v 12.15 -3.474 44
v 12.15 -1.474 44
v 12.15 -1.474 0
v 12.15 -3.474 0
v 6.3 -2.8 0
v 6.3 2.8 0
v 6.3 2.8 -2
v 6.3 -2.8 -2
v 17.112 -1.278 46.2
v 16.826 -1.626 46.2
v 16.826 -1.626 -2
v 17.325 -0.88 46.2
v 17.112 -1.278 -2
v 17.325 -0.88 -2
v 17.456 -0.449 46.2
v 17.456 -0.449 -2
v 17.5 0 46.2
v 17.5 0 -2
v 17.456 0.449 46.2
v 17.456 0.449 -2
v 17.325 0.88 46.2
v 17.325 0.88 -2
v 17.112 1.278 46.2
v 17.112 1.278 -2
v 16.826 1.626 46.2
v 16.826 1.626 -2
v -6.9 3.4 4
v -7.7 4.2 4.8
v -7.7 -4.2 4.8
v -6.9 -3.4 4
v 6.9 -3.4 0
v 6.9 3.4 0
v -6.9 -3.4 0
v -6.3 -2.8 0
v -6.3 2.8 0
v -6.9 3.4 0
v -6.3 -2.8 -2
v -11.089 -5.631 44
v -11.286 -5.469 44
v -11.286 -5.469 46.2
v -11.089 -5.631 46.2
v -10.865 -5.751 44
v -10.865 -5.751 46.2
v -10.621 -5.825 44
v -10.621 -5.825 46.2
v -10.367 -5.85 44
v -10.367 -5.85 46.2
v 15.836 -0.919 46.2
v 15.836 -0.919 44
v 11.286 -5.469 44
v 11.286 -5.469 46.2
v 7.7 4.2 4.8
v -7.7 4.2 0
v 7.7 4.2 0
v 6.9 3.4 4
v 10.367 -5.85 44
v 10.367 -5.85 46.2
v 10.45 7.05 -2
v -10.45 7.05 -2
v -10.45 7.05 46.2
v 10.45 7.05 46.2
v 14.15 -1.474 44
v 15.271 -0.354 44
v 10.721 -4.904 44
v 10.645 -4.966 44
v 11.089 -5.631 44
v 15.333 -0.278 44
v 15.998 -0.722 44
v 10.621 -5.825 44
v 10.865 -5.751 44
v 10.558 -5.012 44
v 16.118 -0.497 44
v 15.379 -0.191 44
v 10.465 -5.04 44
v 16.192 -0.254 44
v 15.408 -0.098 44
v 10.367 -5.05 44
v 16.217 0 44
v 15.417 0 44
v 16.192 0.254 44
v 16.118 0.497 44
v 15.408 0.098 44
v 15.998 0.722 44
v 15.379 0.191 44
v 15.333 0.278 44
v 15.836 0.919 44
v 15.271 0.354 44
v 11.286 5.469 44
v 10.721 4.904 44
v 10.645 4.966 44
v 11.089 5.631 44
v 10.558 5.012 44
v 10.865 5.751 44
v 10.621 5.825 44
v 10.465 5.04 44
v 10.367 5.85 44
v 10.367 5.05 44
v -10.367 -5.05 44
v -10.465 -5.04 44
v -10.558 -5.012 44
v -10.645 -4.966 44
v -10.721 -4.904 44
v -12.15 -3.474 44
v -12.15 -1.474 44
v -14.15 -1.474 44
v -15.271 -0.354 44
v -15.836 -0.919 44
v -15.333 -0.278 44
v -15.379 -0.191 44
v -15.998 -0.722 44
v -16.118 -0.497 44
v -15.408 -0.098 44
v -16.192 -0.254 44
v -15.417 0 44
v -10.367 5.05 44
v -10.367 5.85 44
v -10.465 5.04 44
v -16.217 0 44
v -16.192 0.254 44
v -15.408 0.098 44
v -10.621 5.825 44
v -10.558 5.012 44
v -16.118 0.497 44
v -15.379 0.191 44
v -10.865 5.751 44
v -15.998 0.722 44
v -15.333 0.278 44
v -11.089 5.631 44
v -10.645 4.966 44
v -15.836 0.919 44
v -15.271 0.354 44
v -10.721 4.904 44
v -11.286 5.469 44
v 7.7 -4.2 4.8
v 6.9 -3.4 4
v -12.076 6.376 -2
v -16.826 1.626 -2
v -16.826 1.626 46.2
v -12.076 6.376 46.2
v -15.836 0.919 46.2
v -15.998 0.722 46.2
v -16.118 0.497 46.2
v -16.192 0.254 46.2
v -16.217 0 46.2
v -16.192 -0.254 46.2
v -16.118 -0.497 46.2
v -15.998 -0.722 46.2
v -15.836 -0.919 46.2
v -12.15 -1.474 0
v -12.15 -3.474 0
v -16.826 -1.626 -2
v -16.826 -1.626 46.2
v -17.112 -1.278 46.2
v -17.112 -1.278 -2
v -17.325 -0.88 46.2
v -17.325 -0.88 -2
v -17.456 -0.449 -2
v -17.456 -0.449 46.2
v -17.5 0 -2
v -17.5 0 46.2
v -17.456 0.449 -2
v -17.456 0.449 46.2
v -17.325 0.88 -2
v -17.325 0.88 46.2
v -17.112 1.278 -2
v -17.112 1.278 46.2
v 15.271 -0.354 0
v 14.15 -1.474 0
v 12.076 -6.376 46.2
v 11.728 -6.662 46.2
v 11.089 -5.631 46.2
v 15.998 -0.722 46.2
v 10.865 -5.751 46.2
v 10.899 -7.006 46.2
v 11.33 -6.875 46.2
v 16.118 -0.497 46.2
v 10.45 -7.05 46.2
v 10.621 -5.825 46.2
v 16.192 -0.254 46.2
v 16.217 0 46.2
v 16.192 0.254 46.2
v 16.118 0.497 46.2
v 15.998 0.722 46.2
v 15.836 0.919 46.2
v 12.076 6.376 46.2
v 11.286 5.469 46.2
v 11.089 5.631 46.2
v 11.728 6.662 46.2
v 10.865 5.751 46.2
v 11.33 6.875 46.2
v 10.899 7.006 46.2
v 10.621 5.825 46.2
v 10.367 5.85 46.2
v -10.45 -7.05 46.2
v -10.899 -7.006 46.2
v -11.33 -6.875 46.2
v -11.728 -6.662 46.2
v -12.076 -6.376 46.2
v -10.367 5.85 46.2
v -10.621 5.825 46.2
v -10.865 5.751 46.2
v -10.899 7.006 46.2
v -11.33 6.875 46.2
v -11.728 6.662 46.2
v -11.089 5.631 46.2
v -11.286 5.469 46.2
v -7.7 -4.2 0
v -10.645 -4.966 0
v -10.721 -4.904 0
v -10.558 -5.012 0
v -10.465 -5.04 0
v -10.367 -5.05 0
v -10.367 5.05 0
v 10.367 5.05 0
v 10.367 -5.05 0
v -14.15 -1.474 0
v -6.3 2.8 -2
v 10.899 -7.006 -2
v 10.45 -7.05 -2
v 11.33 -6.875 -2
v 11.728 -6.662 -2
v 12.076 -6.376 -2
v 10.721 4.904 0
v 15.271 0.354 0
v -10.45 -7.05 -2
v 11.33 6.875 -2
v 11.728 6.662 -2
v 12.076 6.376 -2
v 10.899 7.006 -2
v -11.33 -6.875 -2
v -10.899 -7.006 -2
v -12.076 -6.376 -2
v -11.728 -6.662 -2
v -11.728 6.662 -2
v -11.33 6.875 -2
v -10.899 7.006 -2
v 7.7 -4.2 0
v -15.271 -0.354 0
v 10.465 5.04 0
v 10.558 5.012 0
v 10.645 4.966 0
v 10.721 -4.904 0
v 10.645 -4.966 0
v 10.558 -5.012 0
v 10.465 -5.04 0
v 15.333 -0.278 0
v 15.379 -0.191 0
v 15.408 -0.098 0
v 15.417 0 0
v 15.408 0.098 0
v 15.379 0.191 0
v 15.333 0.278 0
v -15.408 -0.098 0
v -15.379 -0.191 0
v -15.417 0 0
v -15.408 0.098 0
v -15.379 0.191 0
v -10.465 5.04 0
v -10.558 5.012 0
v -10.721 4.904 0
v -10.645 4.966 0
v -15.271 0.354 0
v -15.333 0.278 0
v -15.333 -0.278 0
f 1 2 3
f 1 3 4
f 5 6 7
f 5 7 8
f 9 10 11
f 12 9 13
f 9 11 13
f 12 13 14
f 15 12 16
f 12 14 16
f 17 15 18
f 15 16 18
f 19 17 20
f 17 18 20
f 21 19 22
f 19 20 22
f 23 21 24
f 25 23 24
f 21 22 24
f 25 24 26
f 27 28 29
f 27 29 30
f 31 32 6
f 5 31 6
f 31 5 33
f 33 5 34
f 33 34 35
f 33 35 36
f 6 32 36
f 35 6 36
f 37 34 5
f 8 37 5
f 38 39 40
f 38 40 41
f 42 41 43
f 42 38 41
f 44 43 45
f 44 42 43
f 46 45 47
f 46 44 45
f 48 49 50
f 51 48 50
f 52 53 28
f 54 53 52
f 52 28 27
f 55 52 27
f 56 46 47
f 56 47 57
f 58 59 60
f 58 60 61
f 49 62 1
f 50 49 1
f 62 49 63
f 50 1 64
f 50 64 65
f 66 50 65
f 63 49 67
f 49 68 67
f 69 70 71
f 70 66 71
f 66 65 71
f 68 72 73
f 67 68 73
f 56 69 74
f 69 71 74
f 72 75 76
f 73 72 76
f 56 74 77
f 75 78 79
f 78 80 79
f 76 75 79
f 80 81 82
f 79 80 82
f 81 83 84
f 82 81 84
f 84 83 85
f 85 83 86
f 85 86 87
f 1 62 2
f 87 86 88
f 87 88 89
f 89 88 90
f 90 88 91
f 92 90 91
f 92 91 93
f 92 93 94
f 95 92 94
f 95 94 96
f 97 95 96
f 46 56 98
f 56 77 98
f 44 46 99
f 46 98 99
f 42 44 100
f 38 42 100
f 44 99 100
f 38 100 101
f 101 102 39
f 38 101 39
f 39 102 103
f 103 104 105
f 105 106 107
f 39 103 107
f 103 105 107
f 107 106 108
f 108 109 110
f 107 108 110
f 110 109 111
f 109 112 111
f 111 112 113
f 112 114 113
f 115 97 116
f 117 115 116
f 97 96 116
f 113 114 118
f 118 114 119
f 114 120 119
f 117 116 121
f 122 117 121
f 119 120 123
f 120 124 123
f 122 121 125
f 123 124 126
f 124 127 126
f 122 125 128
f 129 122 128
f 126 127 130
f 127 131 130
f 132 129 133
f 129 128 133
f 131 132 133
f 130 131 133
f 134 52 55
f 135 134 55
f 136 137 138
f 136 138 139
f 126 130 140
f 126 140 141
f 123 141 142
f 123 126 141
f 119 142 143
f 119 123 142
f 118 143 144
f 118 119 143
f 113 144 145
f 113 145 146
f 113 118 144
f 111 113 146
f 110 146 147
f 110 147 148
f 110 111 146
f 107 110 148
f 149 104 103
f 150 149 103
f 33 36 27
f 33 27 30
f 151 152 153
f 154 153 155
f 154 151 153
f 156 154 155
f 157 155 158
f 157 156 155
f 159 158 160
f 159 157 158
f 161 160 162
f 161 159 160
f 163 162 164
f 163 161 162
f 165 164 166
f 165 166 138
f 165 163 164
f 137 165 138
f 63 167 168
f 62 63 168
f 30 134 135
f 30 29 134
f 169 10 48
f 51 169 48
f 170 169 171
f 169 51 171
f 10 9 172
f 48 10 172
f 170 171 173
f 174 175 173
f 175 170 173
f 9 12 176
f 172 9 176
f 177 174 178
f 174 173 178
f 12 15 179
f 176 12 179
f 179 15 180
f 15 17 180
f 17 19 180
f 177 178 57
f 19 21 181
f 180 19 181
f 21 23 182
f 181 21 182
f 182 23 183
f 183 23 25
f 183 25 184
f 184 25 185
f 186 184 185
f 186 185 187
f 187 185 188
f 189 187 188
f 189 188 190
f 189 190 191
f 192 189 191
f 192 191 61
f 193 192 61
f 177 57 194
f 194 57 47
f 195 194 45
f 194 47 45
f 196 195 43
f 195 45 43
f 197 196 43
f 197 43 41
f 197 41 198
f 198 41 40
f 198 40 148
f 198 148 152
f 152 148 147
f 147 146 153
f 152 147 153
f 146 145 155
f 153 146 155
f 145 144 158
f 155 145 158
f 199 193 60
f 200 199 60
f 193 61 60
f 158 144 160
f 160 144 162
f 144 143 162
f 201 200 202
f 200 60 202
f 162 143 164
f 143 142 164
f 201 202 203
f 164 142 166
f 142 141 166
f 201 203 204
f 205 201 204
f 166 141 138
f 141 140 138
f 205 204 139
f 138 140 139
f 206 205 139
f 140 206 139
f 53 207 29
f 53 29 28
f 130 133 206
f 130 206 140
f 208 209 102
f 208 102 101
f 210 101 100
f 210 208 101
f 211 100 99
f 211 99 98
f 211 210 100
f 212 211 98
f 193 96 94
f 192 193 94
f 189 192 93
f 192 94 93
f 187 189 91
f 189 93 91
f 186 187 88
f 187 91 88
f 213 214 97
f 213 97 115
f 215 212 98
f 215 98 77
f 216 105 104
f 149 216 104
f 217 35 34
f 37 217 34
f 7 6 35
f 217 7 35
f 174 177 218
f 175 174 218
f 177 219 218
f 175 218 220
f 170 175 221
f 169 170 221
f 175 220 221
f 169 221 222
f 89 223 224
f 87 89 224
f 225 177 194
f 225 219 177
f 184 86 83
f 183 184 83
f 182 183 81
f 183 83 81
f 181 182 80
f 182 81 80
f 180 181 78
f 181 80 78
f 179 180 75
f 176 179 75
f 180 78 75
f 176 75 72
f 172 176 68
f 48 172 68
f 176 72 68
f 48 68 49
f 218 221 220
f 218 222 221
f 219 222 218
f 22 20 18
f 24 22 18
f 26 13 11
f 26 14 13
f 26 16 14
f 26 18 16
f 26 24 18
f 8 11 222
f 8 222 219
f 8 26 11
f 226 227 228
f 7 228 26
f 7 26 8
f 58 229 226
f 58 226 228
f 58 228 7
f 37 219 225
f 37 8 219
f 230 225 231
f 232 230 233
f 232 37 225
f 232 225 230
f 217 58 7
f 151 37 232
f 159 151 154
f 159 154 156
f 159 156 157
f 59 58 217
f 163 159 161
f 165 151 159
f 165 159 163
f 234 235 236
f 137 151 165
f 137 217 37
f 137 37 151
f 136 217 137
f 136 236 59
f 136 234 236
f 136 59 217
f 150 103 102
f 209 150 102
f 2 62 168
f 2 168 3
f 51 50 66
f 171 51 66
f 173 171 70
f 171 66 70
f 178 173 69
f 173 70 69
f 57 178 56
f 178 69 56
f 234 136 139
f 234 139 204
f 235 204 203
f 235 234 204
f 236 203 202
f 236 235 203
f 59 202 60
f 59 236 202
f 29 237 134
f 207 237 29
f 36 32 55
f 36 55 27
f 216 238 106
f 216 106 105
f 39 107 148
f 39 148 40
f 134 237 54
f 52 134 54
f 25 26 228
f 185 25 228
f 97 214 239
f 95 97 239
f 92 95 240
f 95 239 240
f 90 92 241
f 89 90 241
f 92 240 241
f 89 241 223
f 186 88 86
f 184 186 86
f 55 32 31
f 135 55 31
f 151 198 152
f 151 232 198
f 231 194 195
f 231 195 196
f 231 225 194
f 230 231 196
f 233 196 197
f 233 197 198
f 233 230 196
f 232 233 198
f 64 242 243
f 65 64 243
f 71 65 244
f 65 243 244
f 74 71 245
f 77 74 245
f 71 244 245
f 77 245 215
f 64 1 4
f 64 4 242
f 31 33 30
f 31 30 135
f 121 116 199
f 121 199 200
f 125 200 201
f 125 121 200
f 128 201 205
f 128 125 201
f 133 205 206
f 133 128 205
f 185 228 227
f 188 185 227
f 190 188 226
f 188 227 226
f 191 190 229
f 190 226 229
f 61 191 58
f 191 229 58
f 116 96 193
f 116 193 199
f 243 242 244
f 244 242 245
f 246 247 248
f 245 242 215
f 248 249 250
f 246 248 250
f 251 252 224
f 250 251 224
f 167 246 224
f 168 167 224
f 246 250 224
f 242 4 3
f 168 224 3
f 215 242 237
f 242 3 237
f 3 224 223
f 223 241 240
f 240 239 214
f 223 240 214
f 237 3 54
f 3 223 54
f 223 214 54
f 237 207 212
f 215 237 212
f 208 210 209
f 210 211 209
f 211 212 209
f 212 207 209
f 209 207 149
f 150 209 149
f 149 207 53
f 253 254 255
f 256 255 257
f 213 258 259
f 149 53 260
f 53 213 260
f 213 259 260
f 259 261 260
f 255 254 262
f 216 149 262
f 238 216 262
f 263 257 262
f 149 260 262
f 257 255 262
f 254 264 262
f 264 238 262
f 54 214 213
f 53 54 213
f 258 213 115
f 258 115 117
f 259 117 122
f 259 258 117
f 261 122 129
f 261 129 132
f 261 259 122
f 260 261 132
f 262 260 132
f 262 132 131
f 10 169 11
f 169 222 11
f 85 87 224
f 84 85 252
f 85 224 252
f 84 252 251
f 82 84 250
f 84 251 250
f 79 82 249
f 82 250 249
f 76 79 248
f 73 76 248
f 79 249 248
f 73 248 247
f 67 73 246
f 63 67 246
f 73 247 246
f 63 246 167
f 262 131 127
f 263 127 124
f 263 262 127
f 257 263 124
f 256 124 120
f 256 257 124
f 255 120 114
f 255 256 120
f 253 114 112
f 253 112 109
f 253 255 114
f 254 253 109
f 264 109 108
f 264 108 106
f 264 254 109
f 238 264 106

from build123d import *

# Parameters (mm, degrees)
F1_DEPTH     = 2
F2_DEPTH     = 5
F3_DEPTH     = 44
F4_DEPTH     = 46.2
F6_T1_DEPTH  = 6.8
F6_T3_DEPTH  = 13.8
F6_T9_DEPTH  = 16.371682988
F6_T15_DEPTH = 9.371682988
F6_T24_DEPTH = 9.371682988
F6_T30_DEPTH = 16.371682988
F6_T39_DEPTH = 16.371682988
F6_T45_DEPTH = 9.371682988
F6_T54_DEPTH = 16.371682988
F6_T60_DEPTH = 9.371682988


# Not quite as in the source:
# - a fillet or chamfer that OpenCascade refuses, or shapes differently, is made with other operations: its cross-section is extruded or revolved along the edge and cut away or added
# - a feature names something its author has since deleted; it is built from what else it names


with BuildPart() as f1:
    # F0 (on Top) → F1 (new body)
    with BuildSketch(Plane.XY):
        with BuildLine():
            Line((10.3671572875, 5.05), (0, 5.05))
            Line((0, 5.05), (0, 4.2))
            Line((0, 4.2), (7.7, 4.2))
            Line((7.7, 4.2), (7.7, -4.2))
            Line((7.7, -4.2), (0, -4.2))
            Line((0, -4.2), (0, -5.05))
            Line((0, -5.05), (10.3671572875, -5.05))
            ThreePointArc((10.3671572875, -5.05), (10.5584990037, -5.0119397663), (10.7207106781, -4.9035533906))
            Line((10.7207106781, -4.9035533906), (12.15, -3.4742640687))
            Line((12.15, -3.4742640687), (12.15, -1.4742640687))
            Line((12.15, -1.4742640687), (14.15, -1.4742640687))
            Line((14.15, -1.4742640687), (15.2707106781, -0.3535533906))
            ThreePointArc((15.2707106781, -0.3535533906), (15.4171572875, 0), (15.2707106781, 0.3535533906))
            Line((15.2707106781, 0.3535533906), (10.7207106781, 4.9035533906))
            ThreePointArc((10.7207106781, 4.9035533906), (10.5584990037, 5.0119397663), (10.3671572875, 5.05))
        make_face()
        Polygon((6.9, 3.4), (0, 3.4), (0, 2.8), (6.3, 2.8), (6.3, -2.8), (0, -2.8), (0, -3.4), (6.9, -3.4), align=None)
        Polygon((7.7, 4.2), (0, 4.2), (0, 3.4), (6.9, 3.4), (6.9, -3.4), (0, -3.4), (0, -4.2), (7.7, -4.2), align=None)
        with BuildLine():
            Line((10.45, 7.05), (0, 7.05))
            Line((0, 7.05), (0, 5.85))
            Line((0, 5.85), (10.3671572875, 5.85))
            ThreePointArc((10.3671572875, 5.85), (10.8646457496, 5.7510433923), (11.2863961031, 5.4692388155))
            Line((11.2863961031, 5.4692388155), (15.8363961031, 0.9192388155))
            ThreePointArc((15.8363961031, 0.9192388155), (16.2171572875, 0), (15.8363961031, -0.9192388155))
            Line((15.8363961031, -0.9192388155), (11.2863961031, -5.4692388155))
            ThreePointArc((11.2863961031, -5.4692388155), (10.8646457496, -5.7510433923), (10.3671572875, -5.85))
            Line((10.3671572875, -5.85), (0, -5.85))
            Line((0, -5.85), (0, -7.05))
            Line((0, -7.05), (10.45, -7.05))
            ThreePointArc((10.45, -7.05), (11.3301718944, -6.8749229248), (12.0763455967, -6.3763455967))
            Line((12.0763455967, -6.3763455967), (16.8263455967, -1.6263455967))
            ThreePointArc((16.8263455967, -1.6263455967), (17.5, 0), (16.8263455967, 1.6263455967))
            Line((16.8263455967, 1.6263455967), (12.0763455967, 6.3763455967))
            ThreePointArc((12.0763455967, 6.3763455967), (11.3301718944, 6.8749229248), (10.45, 7.05))
        make_face()
        with BuildLine():
            Line((10.3671572875, 5.85), (0, 5.85))
            Line((0, 5.85), (0, 5.05))
            Line((0, 5.05), (10.3671572875, 5.05))
            ThreePointArc((10.3671572875, 5.05), (10.5584990037, 5.0119397663), (10.7207106781, 4.9035533906))
            Line((10.7207106781, 4.9035533906), (15.2707106781, 0.3535533906))
            ThreePointArc((15.2707106781, 0.3535533906), (15.4171572875, 0), (15.2707106781, -0.3535533906))
            Line((15.2707106781, -0.3535533906), (14.15, -1.4742640687))
            Line((14.15, -1.4742640687), (12.15, -1.4742640687))
            Line((12.15, -1.4742640687), (12.15, -3.4742640687))
            Line((12.15, -3.4742640687), (10.7207106781, -4.9035533906))
            ThreePointArc((10.7207106781, -4.9035533906), (10.5584990037, -5.0119397663), (10.3671572875, -5.05))
            Line((10.3671572875, -5.05), (0, -5.05))
            Line((0, -5.05), (0, -5.85))
            Line((0, -5.85), (10.3671572875, -5.85))
            ThreePointArc((10.3671572875, -5.85), (10.8646457496, -5.7510433923), (11.2863961031, -5.4692388155))
            Line((11.2863961031, -5.4692388155), (15.8363961031, -0.9192388155))
            ThreePointArc((15.8363961031, -0.9192388155), (16.2171572875, 0), (15.8363961031, 0.9192388155))
            Line((15.8363961031, 0.9192388155), (11.2863961031, 5.4692388155))
            ThreePointArc((11.2863961031, 5.4692388155), (10.8646457496, 5.7510433923), (10.3671572875, 5.85))
        make_face()
    extrude(amount=-F1_DEPTH)

    # F0 (on Top) → F2 (join)
    with BuildSketch(Plane.XY):
        Polygon((7.7, 4.2), (0, 4.2), (0, 3.4), (6.9, 3.4), (6.9, -3.4), (0, -3.4), (0, -4.2), (7.7, -4.2), align=None)
    extrude(amount=F2_DEPTH)

    # F0 (on Top) → F3 (join)
    with BuildSketch(Plane.XY):
        with BuildLine():
            Line((10.3671572875, 5.85), (0, 5.85))
            Line((0, 5.85), (0, 5.05))
            Line((0, 5.05), (10.3671572875, 5.05))
            ThreePointArc((10.3671572875, 5.05), (10.5584990037, 5.0119397663), (10.7207106781, 4.9035533906))
            Line((10.7207106781, 4.9035533906), (15.2707106781, 0.3535533906))
            ThreePointArc((15.2707106781, 0.3535533906), (15.4171572875, 0), (15.2707106781, -0.3535533906))
            Line((15.2707106781, -0.3535533906), (14.15, -1.4742640687))
            Line((14.15, -1.4742640687), (12.15, -1.4742640687))
            Line((12.15, -1.4742640687), (12.15, -3.4742640687))
            Line((12.15, -3.4742640687), (10.7207106781, -4.9035533906))
            ThreePointArc((10.7207106781, -4.9035533906), (10.5584990037, -5.0119397663), (10.3671572875, -5.05))
            Line((10.3671572875, -5.05), (0, -5.05))
            Line((0, -5.05), (0, -5.85))
            Line((0, -5.85), (10.3671572875, -5.85))
            ThreePointArc((10.3671572875, -5.85), (10.8646457496, -5.7510433923), (11.2863961031, -5.4692388155))
            Line((11.2863961031, -5.4692388155), (15.8363961031, -0.9192388155))
            ThreePointArc((15.8363961031, -0.9192388155), (16.2171572875, 0), (15.8363961031, 0.9192388155))
            Line((15.8363961031, 0.9192388155), (11.2863961031, 5.4692388155))
            ThreePointArc((11.2863961031, 5.4692388155), (10.8646457496, 5.7510433923), (10.3671572875, 5.85))
        make_face()
    extrude(amount=F3_DEPTH)

    # F0 (on Top) → F4 (join)
    with BuildSketch(Plane.XY):
        with BuildLine():
            Line((10.45, 7.05), (0, 7.05))
            Line((0, 7.05), (0, 5.85))
            Line((0, 5.85), (10.3671572875, 5.85))
            ThreePointArc((10.3671572875, 5.85), (10.8646457496, 5.7510433923), (11.2863961031, 5.4692388155))
            Line((11.2863961031, 5.4692388155), (15.8363961031, 0.9192388155))
            ThreePointArc((15.8363961031, 0.9192388155), (16.2171572875, 0), (15.8363961031, -0.9192388155))
            Line((15.8363961031, -0.9192388155), (11.2863961031, -5.4692388155))
            ThreePointArc((11.2863961031, -5.4692388155), (10.8646457496, -5.7510433923), (10.3671572875, -5.85))
            Line((10.3671572875, -5.85), (0, -5.85))
            Line((0, -5.85), (0, -7.05))
            Line((0, -7.05), (10.45, -7.05))
            ThreePointArc((10.45, -7.05), (11.3301718944, -6.8749229248), (12.0763455967, -6.3763455967))
            Line((12.0763455967, -6.3763455967), (16.8263455967, -1.6263455967))
            ThreePointArc((16.8263455967, -1.6263455967), (17.5, 0), (16.8263455967, 1.6263455967))
            Line((16.8263455967, 1.6263455967), (12.0763455967, 6.3763455967))
            ThreePointArc((12.0763455967, 6.3763455967), (11.3301718944, 6.8749229248), (10.45, 7.05))
        make_face()
    extrude(amount=F4_DEPTH)

    # F5: F1 across face


with BuildPart() as f1_1:
    add(f1.part)
    add(f1.part.mirror(Plane(origin=(0, 5.8802646888, 19.9395384914), x_dir=(0, -1, 0), z_dir=(-1, 0, 0))))

    # F6: chamfer of 1 on 4 edges, made by hand

    # F6_s2 → F6_t1 (cut)
    with BuildSketch(Plane.XZ.offset(-3.4)):
        Polygon((7.9, 5), (6.9, 4), (6.9, 5), align=None)
        Polygon((-7.9, 5), (-6.9, 4), (-6.9, 5), align=None)
    extrude(amount=F6_T1_DEPTH, mode=Mode.SUBTRACT)

    # F6_s4 → F6_t3 (cut)
    with BuildSketch(Plane.YZ.offset(-6.9)):
        Polygon((4.4, 5), (3.4, 4), (3.4, 5), align=None)
        Polygon((-4.4, 5), (-3.4, 4), (-3.4, 5), align=None)
    extrude(amount=F6_T3_DEPTH, mode=Mode.SUBTRACT)


with BuildPart() as f6_tool7:
    # F6_s8 → F6_t9 (new body)
    with BuildSketch(Plane.YZ.offset(9.471682988)):
        Polygon((4.4, 5), (3.4, 4), (3.4, 5), align=None)
    extrude(amount=-F6_T9_DEPTH)

    split(bisect_by=Plane.YZ.offset(7.7), keep=Keep.BOTTOM)

    split(bisect_by=Plane.YZ.offset(6.9), keep=Keep.TOP)

    split(bisect_by=Plane.XZ.offset(-4.2), keep=Keep.TOP)


with BuildPart() as f6_tool13:
    # F6_s14 → F6_t15 (new body)
    with BuildSketch(Plane.XZ.offset(-5.971682988)):
        Polygon((7.9, 5), (6.9, 4), (6.9, 5), align=None)
    extrude(amount=F6_T15_DEPTH)

    split(bisect_by=Plane.YZ.offset(7.7), keep=Keep.BOTTOM)

    split(bisect_by=Plane.XZ.offset(-3.4), keep=Keep.BOTTOM)

    split(bisect_by=Plane.XZ.offset(-4.2), keep=Keep.TOP)


with BuildPart() as f6_tool7_1:
    add(f6_tool7.part)

    # F6_t19: intersect F6_tool13
    add(f6_tool13.part, mode=Mode.INTERSECT)


with BuildPart() as f1_2:
    add(f1_1.part)

    # F6_t5: cut F6_tool7
    add(f6_tool7_1.part, mode=Mode.SUBTRACT)


with BuildPart() as f6_tool22:
    # F6_s23 → F6_t24 (new body)
    with BuildSketch(Plane.XZ.offset(-3.4)):
        Polygon((7.9, 5), (6.9, 4), (6.9, 5), align=None)
    extrude(amount=F6_T24_DEPTH)

    split(bisect_by=Plane.YZ.offset(7.7), keep=Keep.BOTTOM)

    split(bisect_by=Plane.XZ.offset(3.4), keep=Keep.TOP)

    split(bisect_by=Plane.XZ.offset(4.2), keep=Keep.BOTTOM)


with BuildPart() as f6_tool28:
    # F6_s29 → F6_t30 (new body)
    with BuildSketch(Plane.YZ.offset(-6.9)):
        Polygon((-4.4, 5), (-3.4, 4), (-3.4, 5), align=None)
    extrude(amount=F6_T30_DEPTH)

    split(bisect_by=Plane.YZ.offset(7.7), keep=Keep.BOTTOM)

    split(bisect_by=Plane.YZ.offset(6.9), keep=Keep.TOP)

    split(bisect_by=Plane.XZ.offset(4.2), keep=Keep.BOTTOM)


with BuildPart() as f6_tool22_1:
    add(f6_tool22.part)

    # F6_t34: intersect F6_tool28
    add(f6_tool28.part, mode=Mode.INTERSECT)


with BuildPart() as f1_3:
    add(f1_2.part)

    # F6_t20: cut F6_tool22
    add(f6_tool22_1.part, mode=Mode.SUBTRACT)


with BuildPart() as f6_tool37:
    # F6_s38 → F6_t39 (new body)
    with BuildSketch(Plane.YZ.offset(6.9)):
        Polygon((4.4, 5), (3.4, 4), (3.4, 5), align=None)
    extrude(amount=-F6_T39_DEPTH)

    split(bisect_by=Plane.YZ.offset(-6.9), keep=Keep.BOTTOM)

    split(bisect_by=Plane.XZ.offset(-4.2), keep=Keep.TOP)

    split(bisect_by=Plane.YZ.offset(-7.7), keep=Keep.TOP)


with BuildPart() as f6_tool43:
    # F6_s44 → F6_t45 (new body)
    with BuildSketch(Plane.XZ.offset(-5.971682988)):
        Polygon((-7.9, 5), (-6.9, 4), (-6.9, 5), align=None)
    extrude(amount=F6_T45_DEPTH)

    split(bisect_by=Plane.XZ.offset(-3.4), keep=Keep.BOTTOM)

    split(bisect_by=Plane.XZ.offset(-4.2), keep=Keep.TOP)

    split(bisect_by=Plane.YZ.offset(-7.7), keep=Keep.TOP)


with BuildPart() as f6_tool37_1:
    add(f6_tool37.part)

    # F6_t49: intersect F6_tool43
    add(f6_tool43.part, mode=Mode.INTERSECT)


with BuildPart() as f1_4:
    add(f1_3.part)

    # F6_t35: cut F6_tool37
    add(f6_tool37_1.part, mode=Mode.SUBTRACT)


with BuildPart() as f6_tool52:
    # F6_s53 → F6_t54 (new body)
    with BuildSketch(Plane.YZ.offset(-9.471682988)):
        Polygon((-4.4, 5), (-3.4, 4), (-3.4, 5), align=None)
    extrude(amount=F6_T54_DEPTH)

    split(bisect_by=Plane.YZ.offset(-6.9), keep=Keep.BOTTOM)

    split(bisect_by=Plane.YZ.offset(-7.7), keep=Keep.TOP)

    split(bisect_by=Plane.XZ.offset(4.2), keep=Keep.BOTTOM)


with BuildPart() as f6_tool58:
    # F6_s59 → F6_t60 (new body)
    with BuildSketch(Plane.XZ.offset(-3.4)):
        Polygon((-7.9, 5), (-6.9, 4), (-6.9, 5), align=None)
    extrude(amount=F6_T60_DEPTH)

    split(bisect_by=Plane.XZ.offset(3.4), keep=Keep.TOP)

    split(bisect_by=Plane.YZ.offset(-7.7), keep=Keep.TOP)

    split(bisect_by=Plane.XZ.offset(4.2), keep=Keep.BOTTOM)


with BuildPart() as f6_tool52_1:
    add(f6_tool52.part)

    # F6_t64: intersect F6_tool58
    add(f6_tool58.part, mode=Mode.INTERSECT)


with BuildPart() as f1_5:
    add(f1_4.part)

    # F6_t50: cut F6_tool52
    add(f6_tool52_1.part, mode=Mode.SUBTRACT)


solid = f1_5.part
